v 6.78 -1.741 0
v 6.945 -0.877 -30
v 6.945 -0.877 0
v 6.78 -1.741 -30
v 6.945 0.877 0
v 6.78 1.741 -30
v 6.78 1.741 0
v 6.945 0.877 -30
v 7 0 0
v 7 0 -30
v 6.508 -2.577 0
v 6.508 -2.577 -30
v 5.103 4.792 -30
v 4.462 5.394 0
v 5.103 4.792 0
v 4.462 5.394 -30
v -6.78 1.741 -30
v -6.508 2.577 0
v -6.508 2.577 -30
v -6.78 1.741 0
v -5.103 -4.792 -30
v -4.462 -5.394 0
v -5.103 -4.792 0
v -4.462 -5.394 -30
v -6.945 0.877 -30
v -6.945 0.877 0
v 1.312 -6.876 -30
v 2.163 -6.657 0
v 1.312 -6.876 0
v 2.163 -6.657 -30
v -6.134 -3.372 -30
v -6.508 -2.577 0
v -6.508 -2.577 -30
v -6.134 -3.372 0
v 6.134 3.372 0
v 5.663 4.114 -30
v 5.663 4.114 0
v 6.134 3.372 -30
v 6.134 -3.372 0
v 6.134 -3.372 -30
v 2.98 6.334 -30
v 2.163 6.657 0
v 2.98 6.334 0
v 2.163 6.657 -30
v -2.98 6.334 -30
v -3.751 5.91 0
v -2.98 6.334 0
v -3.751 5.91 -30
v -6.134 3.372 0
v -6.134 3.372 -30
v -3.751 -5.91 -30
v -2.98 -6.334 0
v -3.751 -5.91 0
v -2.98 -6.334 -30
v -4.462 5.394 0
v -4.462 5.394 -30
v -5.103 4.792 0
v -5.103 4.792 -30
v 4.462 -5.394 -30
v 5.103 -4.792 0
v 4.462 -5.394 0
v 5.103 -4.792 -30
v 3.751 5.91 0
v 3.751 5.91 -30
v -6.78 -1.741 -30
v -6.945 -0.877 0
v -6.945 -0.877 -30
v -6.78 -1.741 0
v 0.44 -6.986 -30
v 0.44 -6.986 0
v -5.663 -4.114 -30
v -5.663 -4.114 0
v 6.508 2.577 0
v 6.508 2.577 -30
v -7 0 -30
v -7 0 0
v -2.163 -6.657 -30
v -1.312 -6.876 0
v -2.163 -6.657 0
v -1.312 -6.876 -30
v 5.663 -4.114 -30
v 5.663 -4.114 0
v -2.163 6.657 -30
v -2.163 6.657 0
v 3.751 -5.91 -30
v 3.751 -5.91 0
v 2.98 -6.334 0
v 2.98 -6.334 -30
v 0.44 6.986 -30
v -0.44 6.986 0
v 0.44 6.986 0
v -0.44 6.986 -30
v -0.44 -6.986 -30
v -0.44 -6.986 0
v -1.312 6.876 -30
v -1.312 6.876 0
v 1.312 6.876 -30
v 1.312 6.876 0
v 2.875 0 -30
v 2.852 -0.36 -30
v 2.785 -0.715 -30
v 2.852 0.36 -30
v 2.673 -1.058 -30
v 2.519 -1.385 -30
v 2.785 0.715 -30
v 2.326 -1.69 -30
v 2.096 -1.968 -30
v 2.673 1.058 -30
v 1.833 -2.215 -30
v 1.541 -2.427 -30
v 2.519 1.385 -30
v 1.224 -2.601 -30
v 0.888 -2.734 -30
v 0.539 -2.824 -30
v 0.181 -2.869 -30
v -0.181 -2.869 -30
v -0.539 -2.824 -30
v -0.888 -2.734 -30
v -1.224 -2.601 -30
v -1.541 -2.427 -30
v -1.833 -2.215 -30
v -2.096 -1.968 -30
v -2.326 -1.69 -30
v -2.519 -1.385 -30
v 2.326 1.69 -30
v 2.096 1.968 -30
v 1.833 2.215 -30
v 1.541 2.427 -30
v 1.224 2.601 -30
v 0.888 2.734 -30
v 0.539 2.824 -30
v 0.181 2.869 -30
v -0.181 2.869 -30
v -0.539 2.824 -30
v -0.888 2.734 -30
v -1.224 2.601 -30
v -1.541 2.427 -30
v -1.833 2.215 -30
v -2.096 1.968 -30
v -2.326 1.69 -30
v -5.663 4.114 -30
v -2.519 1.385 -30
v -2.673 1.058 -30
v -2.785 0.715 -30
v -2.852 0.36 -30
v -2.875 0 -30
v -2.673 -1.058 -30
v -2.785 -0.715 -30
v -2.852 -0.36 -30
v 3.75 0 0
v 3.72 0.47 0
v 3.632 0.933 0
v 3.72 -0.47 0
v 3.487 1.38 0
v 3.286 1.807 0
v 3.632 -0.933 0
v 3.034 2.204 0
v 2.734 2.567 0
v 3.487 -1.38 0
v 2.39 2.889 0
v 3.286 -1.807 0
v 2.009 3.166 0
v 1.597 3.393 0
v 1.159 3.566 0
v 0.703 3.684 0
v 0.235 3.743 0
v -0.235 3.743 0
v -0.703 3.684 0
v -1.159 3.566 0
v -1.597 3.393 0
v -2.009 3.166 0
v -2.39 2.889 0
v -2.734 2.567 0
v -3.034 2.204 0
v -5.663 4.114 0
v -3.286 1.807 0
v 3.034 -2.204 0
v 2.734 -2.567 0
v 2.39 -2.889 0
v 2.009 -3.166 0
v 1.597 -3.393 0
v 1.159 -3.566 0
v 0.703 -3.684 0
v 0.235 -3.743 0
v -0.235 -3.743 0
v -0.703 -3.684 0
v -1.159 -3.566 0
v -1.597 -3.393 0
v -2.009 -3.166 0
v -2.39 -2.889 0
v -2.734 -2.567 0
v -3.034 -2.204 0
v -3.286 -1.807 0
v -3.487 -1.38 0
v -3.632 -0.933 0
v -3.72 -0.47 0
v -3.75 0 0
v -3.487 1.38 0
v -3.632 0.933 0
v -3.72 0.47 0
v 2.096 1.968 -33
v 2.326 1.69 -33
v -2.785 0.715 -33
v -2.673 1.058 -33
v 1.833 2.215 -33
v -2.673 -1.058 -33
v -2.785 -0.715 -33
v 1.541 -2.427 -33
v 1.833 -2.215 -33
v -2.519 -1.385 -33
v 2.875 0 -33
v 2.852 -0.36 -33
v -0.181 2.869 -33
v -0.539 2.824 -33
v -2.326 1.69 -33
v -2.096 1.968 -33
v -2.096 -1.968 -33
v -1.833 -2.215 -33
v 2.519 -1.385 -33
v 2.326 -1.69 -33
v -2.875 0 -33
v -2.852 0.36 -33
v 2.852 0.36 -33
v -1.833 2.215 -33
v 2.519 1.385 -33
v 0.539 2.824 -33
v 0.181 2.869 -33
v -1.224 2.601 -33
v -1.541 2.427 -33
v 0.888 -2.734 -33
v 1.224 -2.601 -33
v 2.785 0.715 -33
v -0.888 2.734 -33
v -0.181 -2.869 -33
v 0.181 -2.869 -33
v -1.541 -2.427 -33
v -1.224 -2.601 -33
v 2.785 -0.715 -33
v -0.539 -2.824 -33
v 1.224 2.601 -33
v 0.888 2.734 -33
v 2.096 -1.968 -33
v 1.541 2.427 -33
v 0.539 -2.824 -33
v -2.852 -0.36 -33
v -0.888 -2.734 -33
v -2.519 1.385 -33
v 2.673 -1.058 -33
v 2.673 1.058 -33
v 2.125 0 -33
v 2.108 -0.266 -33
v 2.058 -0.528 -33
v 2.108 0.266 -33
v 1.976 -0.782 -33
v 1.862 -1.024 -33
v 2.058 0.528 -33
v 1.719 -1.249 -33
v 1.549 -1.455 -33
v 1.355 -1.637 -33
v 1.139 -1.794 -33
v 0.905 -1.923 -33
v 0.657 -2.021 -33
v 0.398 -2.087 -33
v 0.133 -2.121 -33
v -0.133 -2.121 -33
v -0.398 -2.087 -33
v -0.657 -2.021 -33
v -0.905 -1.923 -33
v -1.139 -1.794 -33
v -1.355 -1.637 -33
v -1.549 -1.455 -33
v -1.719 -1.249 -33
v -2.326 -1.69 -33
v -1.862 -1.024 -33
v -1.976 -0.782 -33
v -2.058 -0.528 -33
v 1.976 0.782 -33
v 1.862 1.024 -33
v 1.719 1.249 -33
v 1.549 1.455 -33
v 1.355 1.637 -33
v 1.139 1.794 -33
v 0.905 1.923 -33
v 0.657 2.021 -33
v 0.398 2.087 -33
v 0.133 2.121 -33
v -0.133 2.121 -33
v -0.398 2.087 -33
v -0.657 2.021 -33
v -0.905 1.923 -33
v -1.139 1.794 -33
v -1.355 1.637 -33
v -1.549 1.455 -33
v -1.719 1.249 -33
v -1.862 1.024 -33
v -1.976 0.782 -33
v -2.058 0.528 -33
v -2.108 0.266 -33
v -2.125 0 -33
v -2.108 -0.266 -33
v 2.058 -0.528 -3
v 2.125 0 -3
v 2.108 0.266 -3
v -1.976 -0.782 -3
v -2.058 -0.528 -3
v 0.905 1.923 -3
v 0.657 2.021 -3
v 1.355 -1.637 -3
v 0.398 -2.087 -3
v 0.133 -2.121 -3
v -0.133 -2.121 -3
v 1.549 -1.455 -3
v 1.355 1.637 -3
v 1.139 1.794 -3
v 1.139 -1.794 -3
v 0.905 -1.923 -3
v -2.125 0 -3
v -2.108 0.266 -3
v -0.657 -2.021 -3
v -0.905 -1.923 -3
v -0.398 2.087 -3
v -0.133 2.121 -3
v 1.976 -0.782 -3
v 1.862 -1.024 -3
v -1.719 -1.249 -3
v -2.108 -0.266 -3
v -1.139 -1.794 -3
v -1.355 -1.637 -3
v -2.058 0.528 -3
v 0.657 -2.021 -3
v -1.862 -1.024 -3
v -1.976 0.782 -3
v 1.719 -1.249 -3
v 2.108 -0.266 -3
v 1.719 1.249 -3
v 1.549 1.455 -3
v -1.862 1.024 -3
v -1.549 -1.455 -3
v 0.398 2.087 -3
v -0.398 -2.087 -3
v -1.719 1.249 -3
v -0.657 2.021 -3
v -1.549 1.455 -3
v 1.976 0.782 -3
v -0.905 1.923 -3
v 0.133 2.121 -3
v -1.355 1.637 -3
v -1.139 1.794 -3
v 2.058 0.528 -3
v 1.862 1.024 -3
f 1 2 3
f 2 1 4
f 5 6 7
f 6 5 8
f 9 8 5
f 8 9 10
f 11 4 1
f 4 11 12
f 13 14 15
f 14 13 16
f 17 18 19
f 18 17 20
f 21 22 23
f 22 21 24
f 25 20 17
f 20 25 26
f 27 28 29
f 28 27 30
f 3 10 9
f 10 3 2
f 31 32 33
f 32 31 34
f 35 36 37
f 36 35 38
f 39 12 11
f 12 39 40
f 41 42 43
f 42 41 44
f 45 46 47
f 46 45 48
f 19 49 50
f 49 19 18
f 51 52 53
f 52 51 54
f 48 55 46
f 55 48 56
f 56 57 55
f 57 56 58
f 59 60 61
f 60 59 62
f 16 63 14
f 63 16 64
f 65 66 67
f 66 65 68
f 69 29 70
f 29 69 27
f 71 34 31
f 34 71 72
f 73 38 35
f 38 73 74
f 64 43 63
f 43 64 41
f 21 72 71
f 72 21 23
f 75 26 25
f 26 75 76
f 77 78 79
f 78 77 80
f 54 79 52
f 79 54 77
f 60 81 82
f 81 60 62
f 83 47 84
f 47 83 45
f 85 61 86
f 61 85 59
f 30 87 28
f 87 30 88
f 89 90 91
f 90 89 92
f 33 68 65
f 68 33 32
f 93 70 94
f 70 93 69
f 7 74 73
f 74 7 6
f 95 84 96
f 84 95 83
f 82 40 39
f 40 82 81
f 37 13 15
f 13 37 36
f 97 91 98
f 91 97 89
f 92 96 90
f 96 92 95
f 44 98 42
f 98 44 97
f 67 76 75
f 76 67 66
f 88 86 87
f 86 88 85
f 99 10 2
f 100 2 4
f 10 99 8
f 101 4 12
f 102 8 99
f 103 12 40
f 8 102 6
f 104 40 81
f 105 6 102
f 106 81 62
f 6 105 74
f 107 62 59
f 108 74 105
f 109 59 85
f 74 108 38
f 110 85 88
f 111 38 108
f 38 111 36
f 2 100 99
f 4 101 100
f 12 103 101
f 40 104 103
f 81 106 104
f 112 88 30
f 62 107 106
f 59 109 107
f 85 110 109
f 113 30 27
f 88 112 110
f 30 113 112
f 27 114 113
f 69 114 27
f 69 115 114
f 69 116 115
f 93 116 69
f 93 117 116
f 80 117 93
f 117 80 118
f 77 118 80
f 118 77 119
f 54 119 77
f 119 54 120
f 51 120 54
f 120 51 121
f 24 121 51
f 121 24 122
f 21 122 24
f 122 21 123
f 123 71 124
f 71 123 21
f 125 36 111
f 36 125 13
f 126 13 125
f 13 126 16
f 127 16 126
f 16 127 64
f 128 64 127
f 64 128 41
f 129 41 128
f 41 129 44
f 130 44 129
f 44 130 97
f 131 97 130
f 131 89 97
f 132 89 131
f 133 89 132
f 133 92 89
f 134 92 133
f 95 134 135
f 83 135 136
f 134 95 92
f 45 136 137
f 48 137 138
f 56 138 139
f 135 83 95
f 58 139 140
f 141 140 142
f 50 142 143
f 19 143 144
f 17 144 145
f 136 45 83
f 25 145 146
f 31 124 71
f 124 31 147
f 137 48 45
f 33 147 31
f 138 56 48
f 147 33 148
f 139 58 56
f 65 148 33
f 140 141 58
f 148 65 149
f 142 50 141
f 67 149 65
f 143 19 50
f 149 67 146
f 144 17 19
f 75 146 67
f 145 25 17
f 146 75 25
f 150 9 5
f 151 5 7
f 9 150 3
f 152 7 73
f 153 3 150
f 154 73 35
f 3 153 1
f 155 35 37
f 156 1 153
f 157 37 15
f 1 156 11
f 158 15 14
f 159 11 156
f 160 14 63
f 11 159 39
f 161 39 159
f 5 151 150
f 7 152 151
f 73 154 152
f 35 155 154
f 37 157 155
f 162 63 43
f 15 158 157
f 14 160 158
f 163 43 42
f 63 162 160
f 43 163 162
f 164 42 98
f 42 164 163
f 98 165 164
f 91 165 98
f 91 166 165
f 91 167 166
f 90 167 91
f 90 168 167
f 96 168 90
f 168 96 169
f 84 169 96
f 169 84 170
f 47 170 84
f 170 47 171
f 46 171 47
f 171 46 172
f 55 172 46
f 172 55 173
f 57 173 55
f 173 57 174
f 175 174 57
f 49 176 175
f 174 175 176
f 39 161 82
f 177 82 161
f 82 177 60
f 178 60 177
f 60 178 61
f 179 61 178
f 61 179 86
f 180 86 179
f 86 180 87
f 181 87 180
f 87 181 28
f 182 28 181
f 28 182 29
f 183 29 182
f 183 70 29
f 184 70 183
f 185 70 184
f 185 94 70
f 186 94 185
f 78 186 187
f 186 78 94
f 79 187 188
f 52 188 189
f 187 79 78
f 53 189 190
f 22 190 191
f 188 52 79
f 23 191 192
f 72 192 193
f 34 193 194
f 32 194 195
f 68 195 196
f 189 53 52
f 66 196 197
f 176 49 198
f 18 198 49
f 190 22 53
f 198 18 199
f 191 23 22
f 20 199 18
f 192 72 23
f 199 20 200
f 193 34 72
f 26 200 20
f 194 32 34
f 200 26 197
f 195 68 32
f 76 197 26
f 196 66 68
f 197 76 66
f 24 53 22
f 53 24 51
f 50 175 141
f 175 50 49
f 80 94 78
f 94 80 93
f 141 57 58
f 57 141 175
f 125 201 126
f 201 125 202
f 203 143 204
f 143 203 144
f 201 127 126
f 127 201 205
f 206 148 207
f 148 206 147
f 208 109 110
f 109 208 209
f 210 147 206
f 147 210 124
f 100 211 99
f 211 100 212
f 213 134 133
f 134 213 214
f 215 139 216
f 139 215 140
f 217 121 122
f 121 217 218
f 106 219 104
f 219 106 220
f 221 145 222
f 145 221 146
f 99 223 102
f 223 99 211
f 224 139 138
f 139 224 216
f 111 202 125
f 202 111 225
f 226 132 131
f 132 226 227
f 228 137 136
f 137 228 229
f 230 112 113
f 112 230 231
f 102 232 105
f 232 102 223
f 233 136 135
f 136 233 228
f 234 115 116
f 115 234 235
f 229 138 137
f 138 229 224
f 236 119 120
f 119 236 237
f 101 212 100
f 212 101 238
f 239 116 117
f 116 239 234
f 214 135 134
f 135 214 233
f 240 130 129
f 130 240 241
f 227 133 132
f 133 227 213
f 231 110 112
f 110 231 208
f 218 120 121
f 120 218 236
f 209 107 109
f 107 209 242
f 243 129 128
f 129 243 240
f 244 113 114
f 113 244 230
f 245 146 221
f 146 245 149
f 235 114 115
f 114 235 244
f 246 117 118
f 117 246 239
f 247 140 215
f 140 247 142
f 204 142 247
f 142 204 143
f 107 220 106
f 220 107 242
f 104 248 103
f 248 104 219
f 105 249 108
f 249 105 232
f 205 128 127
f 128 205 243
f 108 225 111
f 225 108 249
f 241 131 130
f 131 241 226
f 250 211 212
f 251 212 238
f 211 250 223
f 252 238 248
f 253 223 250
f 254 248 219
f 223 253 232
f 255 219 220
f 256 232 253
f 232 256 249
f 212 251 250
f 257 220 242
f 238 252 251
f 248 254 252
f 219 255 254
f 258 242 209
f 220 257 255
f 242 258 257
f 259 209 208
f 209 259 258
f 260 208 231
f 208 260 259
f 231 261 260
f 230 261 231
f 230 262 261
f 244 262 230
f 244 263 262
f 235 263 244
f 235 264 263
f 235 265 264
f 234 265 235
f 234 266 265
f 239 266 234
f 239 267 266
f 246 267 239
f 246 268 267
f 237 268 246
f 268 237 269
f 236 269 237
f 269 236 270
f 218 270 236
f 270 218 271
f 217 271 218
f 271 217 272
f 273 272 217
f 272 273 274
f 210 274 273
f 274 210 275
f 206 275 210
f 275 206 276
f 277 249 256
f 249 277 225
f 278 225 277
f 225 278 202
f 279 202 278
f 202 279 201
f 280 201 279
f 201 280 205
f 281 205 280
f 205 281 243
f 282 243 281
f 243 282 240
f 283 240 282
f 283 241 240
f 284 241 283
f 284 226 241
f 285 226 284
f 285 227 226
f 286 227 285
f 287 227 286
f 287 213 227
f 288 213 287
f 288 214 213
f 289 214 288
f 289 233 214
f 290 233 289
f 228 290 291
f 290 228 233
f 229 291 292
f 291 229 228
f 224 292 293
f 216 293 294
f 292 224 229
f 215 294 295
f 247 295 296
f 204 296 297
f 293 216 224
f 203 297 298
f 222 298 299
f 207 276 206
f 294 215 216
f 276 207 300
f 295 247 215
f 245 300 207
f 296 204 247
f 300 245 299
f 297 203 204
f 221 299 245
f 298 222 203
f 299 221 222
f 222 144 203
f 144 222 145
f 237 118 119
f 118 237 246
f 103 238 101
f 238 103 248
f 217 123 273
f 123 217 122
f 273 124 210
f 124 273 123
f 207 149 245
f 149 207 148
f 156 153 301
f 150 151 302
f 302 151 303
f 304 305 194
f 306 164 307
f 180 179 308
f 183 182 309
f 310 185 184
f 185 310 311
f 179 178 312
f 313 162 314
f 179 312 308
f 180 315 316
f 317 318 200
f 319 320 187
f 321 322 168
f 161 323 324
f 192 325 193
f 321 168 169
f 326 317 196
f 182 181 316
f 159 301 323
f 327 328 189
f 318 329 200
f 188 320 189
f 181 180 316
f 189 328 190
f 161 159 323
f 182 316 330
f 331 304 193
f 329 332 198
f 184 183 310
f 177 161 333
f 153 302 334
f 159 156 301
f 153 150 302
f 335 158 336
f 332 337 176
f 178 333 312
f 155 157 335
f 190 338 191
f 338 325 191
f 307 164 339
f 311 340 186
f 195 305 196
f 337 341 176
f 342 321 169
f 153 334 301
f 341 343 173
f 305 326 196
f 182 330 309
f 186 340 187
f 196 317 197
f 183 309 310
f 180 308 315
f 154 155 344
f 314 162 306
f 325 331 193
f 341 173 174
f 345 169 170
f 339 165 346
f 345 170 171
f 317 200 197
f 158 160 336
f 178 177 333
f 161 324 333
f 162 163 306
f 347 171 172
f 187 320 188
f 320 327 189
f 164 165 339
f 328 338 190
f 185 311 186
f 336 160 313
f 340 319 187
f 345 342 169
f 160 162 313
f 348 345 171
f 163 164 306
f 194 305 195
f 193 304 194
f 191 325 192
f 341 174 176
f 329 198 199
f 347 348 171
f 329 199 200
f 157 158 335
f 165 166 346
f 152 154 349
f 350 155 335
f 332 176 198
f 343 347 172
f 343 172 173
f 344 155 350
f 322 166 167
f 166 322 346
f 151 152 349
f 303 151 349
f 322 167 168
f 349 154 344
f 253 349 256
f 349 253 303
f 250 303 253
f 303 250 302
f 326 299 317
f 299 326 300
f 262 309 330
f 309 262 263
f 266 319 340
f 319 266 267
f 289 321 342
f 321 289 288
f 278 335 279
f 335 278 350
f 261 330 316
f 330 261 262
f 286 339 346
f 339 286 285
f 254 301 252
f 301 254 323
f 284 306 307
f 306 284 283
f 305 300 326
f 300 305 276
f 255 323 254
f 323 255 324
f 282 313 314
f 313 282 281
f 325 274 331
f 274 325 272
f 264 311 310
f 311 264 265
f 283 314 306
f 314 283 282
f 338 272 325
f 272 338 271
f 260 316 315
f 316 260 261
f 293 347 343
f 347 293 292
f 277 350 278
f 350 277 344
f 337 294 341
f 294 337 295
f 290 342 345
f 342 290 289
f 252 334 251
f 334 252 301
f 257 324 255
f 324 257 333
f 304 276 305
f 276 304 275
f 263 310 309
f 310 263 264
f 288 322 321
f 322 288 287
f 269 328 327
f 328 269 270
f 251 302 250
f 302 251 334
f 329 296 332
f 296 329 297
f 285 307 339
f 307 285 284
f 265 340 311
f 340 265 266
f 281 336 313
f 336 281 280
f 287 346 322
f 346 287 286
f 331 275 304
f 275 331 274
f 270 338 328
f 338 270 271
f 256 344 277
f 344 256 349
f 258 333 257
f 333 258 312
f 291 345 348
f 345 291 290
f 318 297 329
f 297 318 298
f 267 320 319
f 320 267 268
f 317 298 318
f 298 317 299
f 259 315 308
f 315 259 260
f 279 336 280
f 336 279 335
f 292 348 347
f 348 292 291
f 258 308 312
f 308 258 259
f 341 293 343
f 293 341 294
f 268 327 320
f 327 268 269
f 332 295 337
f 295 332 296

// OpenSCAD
$fn = 50;

difference() {
	union() {
		translate(v = [0, 0, -30.0]) {
			cylinder(h = 30, r = 7.0);
		}
		#translate(v = [0, 0, -33.0]) {
			cylinder(h = 33, r = 2.875);
		}
	}
	union() {
		translate(v = [0, 0, 0]) {
			rotate(a = [0, 0, 0]) {
				difference() {
					union() {
						translate(v = [0, 0, -33.0]) {
							cylinder(h = 33, r = 2.0);
						}
						translate(v = [0, 0, -3]) {
							cylinder(h = 3, r1 = 2.125, r2 = 3.75);
						}
						translate(v = [0, 0, -33.0]) {
							cylinder(h = 33, r = 2.125);
						}
						translate(v = [0, 0, -33.0]) {
							cylinder(h = 33, r = 2.0);
						}
					}
					union();
				}
			}
		}
	}
}
